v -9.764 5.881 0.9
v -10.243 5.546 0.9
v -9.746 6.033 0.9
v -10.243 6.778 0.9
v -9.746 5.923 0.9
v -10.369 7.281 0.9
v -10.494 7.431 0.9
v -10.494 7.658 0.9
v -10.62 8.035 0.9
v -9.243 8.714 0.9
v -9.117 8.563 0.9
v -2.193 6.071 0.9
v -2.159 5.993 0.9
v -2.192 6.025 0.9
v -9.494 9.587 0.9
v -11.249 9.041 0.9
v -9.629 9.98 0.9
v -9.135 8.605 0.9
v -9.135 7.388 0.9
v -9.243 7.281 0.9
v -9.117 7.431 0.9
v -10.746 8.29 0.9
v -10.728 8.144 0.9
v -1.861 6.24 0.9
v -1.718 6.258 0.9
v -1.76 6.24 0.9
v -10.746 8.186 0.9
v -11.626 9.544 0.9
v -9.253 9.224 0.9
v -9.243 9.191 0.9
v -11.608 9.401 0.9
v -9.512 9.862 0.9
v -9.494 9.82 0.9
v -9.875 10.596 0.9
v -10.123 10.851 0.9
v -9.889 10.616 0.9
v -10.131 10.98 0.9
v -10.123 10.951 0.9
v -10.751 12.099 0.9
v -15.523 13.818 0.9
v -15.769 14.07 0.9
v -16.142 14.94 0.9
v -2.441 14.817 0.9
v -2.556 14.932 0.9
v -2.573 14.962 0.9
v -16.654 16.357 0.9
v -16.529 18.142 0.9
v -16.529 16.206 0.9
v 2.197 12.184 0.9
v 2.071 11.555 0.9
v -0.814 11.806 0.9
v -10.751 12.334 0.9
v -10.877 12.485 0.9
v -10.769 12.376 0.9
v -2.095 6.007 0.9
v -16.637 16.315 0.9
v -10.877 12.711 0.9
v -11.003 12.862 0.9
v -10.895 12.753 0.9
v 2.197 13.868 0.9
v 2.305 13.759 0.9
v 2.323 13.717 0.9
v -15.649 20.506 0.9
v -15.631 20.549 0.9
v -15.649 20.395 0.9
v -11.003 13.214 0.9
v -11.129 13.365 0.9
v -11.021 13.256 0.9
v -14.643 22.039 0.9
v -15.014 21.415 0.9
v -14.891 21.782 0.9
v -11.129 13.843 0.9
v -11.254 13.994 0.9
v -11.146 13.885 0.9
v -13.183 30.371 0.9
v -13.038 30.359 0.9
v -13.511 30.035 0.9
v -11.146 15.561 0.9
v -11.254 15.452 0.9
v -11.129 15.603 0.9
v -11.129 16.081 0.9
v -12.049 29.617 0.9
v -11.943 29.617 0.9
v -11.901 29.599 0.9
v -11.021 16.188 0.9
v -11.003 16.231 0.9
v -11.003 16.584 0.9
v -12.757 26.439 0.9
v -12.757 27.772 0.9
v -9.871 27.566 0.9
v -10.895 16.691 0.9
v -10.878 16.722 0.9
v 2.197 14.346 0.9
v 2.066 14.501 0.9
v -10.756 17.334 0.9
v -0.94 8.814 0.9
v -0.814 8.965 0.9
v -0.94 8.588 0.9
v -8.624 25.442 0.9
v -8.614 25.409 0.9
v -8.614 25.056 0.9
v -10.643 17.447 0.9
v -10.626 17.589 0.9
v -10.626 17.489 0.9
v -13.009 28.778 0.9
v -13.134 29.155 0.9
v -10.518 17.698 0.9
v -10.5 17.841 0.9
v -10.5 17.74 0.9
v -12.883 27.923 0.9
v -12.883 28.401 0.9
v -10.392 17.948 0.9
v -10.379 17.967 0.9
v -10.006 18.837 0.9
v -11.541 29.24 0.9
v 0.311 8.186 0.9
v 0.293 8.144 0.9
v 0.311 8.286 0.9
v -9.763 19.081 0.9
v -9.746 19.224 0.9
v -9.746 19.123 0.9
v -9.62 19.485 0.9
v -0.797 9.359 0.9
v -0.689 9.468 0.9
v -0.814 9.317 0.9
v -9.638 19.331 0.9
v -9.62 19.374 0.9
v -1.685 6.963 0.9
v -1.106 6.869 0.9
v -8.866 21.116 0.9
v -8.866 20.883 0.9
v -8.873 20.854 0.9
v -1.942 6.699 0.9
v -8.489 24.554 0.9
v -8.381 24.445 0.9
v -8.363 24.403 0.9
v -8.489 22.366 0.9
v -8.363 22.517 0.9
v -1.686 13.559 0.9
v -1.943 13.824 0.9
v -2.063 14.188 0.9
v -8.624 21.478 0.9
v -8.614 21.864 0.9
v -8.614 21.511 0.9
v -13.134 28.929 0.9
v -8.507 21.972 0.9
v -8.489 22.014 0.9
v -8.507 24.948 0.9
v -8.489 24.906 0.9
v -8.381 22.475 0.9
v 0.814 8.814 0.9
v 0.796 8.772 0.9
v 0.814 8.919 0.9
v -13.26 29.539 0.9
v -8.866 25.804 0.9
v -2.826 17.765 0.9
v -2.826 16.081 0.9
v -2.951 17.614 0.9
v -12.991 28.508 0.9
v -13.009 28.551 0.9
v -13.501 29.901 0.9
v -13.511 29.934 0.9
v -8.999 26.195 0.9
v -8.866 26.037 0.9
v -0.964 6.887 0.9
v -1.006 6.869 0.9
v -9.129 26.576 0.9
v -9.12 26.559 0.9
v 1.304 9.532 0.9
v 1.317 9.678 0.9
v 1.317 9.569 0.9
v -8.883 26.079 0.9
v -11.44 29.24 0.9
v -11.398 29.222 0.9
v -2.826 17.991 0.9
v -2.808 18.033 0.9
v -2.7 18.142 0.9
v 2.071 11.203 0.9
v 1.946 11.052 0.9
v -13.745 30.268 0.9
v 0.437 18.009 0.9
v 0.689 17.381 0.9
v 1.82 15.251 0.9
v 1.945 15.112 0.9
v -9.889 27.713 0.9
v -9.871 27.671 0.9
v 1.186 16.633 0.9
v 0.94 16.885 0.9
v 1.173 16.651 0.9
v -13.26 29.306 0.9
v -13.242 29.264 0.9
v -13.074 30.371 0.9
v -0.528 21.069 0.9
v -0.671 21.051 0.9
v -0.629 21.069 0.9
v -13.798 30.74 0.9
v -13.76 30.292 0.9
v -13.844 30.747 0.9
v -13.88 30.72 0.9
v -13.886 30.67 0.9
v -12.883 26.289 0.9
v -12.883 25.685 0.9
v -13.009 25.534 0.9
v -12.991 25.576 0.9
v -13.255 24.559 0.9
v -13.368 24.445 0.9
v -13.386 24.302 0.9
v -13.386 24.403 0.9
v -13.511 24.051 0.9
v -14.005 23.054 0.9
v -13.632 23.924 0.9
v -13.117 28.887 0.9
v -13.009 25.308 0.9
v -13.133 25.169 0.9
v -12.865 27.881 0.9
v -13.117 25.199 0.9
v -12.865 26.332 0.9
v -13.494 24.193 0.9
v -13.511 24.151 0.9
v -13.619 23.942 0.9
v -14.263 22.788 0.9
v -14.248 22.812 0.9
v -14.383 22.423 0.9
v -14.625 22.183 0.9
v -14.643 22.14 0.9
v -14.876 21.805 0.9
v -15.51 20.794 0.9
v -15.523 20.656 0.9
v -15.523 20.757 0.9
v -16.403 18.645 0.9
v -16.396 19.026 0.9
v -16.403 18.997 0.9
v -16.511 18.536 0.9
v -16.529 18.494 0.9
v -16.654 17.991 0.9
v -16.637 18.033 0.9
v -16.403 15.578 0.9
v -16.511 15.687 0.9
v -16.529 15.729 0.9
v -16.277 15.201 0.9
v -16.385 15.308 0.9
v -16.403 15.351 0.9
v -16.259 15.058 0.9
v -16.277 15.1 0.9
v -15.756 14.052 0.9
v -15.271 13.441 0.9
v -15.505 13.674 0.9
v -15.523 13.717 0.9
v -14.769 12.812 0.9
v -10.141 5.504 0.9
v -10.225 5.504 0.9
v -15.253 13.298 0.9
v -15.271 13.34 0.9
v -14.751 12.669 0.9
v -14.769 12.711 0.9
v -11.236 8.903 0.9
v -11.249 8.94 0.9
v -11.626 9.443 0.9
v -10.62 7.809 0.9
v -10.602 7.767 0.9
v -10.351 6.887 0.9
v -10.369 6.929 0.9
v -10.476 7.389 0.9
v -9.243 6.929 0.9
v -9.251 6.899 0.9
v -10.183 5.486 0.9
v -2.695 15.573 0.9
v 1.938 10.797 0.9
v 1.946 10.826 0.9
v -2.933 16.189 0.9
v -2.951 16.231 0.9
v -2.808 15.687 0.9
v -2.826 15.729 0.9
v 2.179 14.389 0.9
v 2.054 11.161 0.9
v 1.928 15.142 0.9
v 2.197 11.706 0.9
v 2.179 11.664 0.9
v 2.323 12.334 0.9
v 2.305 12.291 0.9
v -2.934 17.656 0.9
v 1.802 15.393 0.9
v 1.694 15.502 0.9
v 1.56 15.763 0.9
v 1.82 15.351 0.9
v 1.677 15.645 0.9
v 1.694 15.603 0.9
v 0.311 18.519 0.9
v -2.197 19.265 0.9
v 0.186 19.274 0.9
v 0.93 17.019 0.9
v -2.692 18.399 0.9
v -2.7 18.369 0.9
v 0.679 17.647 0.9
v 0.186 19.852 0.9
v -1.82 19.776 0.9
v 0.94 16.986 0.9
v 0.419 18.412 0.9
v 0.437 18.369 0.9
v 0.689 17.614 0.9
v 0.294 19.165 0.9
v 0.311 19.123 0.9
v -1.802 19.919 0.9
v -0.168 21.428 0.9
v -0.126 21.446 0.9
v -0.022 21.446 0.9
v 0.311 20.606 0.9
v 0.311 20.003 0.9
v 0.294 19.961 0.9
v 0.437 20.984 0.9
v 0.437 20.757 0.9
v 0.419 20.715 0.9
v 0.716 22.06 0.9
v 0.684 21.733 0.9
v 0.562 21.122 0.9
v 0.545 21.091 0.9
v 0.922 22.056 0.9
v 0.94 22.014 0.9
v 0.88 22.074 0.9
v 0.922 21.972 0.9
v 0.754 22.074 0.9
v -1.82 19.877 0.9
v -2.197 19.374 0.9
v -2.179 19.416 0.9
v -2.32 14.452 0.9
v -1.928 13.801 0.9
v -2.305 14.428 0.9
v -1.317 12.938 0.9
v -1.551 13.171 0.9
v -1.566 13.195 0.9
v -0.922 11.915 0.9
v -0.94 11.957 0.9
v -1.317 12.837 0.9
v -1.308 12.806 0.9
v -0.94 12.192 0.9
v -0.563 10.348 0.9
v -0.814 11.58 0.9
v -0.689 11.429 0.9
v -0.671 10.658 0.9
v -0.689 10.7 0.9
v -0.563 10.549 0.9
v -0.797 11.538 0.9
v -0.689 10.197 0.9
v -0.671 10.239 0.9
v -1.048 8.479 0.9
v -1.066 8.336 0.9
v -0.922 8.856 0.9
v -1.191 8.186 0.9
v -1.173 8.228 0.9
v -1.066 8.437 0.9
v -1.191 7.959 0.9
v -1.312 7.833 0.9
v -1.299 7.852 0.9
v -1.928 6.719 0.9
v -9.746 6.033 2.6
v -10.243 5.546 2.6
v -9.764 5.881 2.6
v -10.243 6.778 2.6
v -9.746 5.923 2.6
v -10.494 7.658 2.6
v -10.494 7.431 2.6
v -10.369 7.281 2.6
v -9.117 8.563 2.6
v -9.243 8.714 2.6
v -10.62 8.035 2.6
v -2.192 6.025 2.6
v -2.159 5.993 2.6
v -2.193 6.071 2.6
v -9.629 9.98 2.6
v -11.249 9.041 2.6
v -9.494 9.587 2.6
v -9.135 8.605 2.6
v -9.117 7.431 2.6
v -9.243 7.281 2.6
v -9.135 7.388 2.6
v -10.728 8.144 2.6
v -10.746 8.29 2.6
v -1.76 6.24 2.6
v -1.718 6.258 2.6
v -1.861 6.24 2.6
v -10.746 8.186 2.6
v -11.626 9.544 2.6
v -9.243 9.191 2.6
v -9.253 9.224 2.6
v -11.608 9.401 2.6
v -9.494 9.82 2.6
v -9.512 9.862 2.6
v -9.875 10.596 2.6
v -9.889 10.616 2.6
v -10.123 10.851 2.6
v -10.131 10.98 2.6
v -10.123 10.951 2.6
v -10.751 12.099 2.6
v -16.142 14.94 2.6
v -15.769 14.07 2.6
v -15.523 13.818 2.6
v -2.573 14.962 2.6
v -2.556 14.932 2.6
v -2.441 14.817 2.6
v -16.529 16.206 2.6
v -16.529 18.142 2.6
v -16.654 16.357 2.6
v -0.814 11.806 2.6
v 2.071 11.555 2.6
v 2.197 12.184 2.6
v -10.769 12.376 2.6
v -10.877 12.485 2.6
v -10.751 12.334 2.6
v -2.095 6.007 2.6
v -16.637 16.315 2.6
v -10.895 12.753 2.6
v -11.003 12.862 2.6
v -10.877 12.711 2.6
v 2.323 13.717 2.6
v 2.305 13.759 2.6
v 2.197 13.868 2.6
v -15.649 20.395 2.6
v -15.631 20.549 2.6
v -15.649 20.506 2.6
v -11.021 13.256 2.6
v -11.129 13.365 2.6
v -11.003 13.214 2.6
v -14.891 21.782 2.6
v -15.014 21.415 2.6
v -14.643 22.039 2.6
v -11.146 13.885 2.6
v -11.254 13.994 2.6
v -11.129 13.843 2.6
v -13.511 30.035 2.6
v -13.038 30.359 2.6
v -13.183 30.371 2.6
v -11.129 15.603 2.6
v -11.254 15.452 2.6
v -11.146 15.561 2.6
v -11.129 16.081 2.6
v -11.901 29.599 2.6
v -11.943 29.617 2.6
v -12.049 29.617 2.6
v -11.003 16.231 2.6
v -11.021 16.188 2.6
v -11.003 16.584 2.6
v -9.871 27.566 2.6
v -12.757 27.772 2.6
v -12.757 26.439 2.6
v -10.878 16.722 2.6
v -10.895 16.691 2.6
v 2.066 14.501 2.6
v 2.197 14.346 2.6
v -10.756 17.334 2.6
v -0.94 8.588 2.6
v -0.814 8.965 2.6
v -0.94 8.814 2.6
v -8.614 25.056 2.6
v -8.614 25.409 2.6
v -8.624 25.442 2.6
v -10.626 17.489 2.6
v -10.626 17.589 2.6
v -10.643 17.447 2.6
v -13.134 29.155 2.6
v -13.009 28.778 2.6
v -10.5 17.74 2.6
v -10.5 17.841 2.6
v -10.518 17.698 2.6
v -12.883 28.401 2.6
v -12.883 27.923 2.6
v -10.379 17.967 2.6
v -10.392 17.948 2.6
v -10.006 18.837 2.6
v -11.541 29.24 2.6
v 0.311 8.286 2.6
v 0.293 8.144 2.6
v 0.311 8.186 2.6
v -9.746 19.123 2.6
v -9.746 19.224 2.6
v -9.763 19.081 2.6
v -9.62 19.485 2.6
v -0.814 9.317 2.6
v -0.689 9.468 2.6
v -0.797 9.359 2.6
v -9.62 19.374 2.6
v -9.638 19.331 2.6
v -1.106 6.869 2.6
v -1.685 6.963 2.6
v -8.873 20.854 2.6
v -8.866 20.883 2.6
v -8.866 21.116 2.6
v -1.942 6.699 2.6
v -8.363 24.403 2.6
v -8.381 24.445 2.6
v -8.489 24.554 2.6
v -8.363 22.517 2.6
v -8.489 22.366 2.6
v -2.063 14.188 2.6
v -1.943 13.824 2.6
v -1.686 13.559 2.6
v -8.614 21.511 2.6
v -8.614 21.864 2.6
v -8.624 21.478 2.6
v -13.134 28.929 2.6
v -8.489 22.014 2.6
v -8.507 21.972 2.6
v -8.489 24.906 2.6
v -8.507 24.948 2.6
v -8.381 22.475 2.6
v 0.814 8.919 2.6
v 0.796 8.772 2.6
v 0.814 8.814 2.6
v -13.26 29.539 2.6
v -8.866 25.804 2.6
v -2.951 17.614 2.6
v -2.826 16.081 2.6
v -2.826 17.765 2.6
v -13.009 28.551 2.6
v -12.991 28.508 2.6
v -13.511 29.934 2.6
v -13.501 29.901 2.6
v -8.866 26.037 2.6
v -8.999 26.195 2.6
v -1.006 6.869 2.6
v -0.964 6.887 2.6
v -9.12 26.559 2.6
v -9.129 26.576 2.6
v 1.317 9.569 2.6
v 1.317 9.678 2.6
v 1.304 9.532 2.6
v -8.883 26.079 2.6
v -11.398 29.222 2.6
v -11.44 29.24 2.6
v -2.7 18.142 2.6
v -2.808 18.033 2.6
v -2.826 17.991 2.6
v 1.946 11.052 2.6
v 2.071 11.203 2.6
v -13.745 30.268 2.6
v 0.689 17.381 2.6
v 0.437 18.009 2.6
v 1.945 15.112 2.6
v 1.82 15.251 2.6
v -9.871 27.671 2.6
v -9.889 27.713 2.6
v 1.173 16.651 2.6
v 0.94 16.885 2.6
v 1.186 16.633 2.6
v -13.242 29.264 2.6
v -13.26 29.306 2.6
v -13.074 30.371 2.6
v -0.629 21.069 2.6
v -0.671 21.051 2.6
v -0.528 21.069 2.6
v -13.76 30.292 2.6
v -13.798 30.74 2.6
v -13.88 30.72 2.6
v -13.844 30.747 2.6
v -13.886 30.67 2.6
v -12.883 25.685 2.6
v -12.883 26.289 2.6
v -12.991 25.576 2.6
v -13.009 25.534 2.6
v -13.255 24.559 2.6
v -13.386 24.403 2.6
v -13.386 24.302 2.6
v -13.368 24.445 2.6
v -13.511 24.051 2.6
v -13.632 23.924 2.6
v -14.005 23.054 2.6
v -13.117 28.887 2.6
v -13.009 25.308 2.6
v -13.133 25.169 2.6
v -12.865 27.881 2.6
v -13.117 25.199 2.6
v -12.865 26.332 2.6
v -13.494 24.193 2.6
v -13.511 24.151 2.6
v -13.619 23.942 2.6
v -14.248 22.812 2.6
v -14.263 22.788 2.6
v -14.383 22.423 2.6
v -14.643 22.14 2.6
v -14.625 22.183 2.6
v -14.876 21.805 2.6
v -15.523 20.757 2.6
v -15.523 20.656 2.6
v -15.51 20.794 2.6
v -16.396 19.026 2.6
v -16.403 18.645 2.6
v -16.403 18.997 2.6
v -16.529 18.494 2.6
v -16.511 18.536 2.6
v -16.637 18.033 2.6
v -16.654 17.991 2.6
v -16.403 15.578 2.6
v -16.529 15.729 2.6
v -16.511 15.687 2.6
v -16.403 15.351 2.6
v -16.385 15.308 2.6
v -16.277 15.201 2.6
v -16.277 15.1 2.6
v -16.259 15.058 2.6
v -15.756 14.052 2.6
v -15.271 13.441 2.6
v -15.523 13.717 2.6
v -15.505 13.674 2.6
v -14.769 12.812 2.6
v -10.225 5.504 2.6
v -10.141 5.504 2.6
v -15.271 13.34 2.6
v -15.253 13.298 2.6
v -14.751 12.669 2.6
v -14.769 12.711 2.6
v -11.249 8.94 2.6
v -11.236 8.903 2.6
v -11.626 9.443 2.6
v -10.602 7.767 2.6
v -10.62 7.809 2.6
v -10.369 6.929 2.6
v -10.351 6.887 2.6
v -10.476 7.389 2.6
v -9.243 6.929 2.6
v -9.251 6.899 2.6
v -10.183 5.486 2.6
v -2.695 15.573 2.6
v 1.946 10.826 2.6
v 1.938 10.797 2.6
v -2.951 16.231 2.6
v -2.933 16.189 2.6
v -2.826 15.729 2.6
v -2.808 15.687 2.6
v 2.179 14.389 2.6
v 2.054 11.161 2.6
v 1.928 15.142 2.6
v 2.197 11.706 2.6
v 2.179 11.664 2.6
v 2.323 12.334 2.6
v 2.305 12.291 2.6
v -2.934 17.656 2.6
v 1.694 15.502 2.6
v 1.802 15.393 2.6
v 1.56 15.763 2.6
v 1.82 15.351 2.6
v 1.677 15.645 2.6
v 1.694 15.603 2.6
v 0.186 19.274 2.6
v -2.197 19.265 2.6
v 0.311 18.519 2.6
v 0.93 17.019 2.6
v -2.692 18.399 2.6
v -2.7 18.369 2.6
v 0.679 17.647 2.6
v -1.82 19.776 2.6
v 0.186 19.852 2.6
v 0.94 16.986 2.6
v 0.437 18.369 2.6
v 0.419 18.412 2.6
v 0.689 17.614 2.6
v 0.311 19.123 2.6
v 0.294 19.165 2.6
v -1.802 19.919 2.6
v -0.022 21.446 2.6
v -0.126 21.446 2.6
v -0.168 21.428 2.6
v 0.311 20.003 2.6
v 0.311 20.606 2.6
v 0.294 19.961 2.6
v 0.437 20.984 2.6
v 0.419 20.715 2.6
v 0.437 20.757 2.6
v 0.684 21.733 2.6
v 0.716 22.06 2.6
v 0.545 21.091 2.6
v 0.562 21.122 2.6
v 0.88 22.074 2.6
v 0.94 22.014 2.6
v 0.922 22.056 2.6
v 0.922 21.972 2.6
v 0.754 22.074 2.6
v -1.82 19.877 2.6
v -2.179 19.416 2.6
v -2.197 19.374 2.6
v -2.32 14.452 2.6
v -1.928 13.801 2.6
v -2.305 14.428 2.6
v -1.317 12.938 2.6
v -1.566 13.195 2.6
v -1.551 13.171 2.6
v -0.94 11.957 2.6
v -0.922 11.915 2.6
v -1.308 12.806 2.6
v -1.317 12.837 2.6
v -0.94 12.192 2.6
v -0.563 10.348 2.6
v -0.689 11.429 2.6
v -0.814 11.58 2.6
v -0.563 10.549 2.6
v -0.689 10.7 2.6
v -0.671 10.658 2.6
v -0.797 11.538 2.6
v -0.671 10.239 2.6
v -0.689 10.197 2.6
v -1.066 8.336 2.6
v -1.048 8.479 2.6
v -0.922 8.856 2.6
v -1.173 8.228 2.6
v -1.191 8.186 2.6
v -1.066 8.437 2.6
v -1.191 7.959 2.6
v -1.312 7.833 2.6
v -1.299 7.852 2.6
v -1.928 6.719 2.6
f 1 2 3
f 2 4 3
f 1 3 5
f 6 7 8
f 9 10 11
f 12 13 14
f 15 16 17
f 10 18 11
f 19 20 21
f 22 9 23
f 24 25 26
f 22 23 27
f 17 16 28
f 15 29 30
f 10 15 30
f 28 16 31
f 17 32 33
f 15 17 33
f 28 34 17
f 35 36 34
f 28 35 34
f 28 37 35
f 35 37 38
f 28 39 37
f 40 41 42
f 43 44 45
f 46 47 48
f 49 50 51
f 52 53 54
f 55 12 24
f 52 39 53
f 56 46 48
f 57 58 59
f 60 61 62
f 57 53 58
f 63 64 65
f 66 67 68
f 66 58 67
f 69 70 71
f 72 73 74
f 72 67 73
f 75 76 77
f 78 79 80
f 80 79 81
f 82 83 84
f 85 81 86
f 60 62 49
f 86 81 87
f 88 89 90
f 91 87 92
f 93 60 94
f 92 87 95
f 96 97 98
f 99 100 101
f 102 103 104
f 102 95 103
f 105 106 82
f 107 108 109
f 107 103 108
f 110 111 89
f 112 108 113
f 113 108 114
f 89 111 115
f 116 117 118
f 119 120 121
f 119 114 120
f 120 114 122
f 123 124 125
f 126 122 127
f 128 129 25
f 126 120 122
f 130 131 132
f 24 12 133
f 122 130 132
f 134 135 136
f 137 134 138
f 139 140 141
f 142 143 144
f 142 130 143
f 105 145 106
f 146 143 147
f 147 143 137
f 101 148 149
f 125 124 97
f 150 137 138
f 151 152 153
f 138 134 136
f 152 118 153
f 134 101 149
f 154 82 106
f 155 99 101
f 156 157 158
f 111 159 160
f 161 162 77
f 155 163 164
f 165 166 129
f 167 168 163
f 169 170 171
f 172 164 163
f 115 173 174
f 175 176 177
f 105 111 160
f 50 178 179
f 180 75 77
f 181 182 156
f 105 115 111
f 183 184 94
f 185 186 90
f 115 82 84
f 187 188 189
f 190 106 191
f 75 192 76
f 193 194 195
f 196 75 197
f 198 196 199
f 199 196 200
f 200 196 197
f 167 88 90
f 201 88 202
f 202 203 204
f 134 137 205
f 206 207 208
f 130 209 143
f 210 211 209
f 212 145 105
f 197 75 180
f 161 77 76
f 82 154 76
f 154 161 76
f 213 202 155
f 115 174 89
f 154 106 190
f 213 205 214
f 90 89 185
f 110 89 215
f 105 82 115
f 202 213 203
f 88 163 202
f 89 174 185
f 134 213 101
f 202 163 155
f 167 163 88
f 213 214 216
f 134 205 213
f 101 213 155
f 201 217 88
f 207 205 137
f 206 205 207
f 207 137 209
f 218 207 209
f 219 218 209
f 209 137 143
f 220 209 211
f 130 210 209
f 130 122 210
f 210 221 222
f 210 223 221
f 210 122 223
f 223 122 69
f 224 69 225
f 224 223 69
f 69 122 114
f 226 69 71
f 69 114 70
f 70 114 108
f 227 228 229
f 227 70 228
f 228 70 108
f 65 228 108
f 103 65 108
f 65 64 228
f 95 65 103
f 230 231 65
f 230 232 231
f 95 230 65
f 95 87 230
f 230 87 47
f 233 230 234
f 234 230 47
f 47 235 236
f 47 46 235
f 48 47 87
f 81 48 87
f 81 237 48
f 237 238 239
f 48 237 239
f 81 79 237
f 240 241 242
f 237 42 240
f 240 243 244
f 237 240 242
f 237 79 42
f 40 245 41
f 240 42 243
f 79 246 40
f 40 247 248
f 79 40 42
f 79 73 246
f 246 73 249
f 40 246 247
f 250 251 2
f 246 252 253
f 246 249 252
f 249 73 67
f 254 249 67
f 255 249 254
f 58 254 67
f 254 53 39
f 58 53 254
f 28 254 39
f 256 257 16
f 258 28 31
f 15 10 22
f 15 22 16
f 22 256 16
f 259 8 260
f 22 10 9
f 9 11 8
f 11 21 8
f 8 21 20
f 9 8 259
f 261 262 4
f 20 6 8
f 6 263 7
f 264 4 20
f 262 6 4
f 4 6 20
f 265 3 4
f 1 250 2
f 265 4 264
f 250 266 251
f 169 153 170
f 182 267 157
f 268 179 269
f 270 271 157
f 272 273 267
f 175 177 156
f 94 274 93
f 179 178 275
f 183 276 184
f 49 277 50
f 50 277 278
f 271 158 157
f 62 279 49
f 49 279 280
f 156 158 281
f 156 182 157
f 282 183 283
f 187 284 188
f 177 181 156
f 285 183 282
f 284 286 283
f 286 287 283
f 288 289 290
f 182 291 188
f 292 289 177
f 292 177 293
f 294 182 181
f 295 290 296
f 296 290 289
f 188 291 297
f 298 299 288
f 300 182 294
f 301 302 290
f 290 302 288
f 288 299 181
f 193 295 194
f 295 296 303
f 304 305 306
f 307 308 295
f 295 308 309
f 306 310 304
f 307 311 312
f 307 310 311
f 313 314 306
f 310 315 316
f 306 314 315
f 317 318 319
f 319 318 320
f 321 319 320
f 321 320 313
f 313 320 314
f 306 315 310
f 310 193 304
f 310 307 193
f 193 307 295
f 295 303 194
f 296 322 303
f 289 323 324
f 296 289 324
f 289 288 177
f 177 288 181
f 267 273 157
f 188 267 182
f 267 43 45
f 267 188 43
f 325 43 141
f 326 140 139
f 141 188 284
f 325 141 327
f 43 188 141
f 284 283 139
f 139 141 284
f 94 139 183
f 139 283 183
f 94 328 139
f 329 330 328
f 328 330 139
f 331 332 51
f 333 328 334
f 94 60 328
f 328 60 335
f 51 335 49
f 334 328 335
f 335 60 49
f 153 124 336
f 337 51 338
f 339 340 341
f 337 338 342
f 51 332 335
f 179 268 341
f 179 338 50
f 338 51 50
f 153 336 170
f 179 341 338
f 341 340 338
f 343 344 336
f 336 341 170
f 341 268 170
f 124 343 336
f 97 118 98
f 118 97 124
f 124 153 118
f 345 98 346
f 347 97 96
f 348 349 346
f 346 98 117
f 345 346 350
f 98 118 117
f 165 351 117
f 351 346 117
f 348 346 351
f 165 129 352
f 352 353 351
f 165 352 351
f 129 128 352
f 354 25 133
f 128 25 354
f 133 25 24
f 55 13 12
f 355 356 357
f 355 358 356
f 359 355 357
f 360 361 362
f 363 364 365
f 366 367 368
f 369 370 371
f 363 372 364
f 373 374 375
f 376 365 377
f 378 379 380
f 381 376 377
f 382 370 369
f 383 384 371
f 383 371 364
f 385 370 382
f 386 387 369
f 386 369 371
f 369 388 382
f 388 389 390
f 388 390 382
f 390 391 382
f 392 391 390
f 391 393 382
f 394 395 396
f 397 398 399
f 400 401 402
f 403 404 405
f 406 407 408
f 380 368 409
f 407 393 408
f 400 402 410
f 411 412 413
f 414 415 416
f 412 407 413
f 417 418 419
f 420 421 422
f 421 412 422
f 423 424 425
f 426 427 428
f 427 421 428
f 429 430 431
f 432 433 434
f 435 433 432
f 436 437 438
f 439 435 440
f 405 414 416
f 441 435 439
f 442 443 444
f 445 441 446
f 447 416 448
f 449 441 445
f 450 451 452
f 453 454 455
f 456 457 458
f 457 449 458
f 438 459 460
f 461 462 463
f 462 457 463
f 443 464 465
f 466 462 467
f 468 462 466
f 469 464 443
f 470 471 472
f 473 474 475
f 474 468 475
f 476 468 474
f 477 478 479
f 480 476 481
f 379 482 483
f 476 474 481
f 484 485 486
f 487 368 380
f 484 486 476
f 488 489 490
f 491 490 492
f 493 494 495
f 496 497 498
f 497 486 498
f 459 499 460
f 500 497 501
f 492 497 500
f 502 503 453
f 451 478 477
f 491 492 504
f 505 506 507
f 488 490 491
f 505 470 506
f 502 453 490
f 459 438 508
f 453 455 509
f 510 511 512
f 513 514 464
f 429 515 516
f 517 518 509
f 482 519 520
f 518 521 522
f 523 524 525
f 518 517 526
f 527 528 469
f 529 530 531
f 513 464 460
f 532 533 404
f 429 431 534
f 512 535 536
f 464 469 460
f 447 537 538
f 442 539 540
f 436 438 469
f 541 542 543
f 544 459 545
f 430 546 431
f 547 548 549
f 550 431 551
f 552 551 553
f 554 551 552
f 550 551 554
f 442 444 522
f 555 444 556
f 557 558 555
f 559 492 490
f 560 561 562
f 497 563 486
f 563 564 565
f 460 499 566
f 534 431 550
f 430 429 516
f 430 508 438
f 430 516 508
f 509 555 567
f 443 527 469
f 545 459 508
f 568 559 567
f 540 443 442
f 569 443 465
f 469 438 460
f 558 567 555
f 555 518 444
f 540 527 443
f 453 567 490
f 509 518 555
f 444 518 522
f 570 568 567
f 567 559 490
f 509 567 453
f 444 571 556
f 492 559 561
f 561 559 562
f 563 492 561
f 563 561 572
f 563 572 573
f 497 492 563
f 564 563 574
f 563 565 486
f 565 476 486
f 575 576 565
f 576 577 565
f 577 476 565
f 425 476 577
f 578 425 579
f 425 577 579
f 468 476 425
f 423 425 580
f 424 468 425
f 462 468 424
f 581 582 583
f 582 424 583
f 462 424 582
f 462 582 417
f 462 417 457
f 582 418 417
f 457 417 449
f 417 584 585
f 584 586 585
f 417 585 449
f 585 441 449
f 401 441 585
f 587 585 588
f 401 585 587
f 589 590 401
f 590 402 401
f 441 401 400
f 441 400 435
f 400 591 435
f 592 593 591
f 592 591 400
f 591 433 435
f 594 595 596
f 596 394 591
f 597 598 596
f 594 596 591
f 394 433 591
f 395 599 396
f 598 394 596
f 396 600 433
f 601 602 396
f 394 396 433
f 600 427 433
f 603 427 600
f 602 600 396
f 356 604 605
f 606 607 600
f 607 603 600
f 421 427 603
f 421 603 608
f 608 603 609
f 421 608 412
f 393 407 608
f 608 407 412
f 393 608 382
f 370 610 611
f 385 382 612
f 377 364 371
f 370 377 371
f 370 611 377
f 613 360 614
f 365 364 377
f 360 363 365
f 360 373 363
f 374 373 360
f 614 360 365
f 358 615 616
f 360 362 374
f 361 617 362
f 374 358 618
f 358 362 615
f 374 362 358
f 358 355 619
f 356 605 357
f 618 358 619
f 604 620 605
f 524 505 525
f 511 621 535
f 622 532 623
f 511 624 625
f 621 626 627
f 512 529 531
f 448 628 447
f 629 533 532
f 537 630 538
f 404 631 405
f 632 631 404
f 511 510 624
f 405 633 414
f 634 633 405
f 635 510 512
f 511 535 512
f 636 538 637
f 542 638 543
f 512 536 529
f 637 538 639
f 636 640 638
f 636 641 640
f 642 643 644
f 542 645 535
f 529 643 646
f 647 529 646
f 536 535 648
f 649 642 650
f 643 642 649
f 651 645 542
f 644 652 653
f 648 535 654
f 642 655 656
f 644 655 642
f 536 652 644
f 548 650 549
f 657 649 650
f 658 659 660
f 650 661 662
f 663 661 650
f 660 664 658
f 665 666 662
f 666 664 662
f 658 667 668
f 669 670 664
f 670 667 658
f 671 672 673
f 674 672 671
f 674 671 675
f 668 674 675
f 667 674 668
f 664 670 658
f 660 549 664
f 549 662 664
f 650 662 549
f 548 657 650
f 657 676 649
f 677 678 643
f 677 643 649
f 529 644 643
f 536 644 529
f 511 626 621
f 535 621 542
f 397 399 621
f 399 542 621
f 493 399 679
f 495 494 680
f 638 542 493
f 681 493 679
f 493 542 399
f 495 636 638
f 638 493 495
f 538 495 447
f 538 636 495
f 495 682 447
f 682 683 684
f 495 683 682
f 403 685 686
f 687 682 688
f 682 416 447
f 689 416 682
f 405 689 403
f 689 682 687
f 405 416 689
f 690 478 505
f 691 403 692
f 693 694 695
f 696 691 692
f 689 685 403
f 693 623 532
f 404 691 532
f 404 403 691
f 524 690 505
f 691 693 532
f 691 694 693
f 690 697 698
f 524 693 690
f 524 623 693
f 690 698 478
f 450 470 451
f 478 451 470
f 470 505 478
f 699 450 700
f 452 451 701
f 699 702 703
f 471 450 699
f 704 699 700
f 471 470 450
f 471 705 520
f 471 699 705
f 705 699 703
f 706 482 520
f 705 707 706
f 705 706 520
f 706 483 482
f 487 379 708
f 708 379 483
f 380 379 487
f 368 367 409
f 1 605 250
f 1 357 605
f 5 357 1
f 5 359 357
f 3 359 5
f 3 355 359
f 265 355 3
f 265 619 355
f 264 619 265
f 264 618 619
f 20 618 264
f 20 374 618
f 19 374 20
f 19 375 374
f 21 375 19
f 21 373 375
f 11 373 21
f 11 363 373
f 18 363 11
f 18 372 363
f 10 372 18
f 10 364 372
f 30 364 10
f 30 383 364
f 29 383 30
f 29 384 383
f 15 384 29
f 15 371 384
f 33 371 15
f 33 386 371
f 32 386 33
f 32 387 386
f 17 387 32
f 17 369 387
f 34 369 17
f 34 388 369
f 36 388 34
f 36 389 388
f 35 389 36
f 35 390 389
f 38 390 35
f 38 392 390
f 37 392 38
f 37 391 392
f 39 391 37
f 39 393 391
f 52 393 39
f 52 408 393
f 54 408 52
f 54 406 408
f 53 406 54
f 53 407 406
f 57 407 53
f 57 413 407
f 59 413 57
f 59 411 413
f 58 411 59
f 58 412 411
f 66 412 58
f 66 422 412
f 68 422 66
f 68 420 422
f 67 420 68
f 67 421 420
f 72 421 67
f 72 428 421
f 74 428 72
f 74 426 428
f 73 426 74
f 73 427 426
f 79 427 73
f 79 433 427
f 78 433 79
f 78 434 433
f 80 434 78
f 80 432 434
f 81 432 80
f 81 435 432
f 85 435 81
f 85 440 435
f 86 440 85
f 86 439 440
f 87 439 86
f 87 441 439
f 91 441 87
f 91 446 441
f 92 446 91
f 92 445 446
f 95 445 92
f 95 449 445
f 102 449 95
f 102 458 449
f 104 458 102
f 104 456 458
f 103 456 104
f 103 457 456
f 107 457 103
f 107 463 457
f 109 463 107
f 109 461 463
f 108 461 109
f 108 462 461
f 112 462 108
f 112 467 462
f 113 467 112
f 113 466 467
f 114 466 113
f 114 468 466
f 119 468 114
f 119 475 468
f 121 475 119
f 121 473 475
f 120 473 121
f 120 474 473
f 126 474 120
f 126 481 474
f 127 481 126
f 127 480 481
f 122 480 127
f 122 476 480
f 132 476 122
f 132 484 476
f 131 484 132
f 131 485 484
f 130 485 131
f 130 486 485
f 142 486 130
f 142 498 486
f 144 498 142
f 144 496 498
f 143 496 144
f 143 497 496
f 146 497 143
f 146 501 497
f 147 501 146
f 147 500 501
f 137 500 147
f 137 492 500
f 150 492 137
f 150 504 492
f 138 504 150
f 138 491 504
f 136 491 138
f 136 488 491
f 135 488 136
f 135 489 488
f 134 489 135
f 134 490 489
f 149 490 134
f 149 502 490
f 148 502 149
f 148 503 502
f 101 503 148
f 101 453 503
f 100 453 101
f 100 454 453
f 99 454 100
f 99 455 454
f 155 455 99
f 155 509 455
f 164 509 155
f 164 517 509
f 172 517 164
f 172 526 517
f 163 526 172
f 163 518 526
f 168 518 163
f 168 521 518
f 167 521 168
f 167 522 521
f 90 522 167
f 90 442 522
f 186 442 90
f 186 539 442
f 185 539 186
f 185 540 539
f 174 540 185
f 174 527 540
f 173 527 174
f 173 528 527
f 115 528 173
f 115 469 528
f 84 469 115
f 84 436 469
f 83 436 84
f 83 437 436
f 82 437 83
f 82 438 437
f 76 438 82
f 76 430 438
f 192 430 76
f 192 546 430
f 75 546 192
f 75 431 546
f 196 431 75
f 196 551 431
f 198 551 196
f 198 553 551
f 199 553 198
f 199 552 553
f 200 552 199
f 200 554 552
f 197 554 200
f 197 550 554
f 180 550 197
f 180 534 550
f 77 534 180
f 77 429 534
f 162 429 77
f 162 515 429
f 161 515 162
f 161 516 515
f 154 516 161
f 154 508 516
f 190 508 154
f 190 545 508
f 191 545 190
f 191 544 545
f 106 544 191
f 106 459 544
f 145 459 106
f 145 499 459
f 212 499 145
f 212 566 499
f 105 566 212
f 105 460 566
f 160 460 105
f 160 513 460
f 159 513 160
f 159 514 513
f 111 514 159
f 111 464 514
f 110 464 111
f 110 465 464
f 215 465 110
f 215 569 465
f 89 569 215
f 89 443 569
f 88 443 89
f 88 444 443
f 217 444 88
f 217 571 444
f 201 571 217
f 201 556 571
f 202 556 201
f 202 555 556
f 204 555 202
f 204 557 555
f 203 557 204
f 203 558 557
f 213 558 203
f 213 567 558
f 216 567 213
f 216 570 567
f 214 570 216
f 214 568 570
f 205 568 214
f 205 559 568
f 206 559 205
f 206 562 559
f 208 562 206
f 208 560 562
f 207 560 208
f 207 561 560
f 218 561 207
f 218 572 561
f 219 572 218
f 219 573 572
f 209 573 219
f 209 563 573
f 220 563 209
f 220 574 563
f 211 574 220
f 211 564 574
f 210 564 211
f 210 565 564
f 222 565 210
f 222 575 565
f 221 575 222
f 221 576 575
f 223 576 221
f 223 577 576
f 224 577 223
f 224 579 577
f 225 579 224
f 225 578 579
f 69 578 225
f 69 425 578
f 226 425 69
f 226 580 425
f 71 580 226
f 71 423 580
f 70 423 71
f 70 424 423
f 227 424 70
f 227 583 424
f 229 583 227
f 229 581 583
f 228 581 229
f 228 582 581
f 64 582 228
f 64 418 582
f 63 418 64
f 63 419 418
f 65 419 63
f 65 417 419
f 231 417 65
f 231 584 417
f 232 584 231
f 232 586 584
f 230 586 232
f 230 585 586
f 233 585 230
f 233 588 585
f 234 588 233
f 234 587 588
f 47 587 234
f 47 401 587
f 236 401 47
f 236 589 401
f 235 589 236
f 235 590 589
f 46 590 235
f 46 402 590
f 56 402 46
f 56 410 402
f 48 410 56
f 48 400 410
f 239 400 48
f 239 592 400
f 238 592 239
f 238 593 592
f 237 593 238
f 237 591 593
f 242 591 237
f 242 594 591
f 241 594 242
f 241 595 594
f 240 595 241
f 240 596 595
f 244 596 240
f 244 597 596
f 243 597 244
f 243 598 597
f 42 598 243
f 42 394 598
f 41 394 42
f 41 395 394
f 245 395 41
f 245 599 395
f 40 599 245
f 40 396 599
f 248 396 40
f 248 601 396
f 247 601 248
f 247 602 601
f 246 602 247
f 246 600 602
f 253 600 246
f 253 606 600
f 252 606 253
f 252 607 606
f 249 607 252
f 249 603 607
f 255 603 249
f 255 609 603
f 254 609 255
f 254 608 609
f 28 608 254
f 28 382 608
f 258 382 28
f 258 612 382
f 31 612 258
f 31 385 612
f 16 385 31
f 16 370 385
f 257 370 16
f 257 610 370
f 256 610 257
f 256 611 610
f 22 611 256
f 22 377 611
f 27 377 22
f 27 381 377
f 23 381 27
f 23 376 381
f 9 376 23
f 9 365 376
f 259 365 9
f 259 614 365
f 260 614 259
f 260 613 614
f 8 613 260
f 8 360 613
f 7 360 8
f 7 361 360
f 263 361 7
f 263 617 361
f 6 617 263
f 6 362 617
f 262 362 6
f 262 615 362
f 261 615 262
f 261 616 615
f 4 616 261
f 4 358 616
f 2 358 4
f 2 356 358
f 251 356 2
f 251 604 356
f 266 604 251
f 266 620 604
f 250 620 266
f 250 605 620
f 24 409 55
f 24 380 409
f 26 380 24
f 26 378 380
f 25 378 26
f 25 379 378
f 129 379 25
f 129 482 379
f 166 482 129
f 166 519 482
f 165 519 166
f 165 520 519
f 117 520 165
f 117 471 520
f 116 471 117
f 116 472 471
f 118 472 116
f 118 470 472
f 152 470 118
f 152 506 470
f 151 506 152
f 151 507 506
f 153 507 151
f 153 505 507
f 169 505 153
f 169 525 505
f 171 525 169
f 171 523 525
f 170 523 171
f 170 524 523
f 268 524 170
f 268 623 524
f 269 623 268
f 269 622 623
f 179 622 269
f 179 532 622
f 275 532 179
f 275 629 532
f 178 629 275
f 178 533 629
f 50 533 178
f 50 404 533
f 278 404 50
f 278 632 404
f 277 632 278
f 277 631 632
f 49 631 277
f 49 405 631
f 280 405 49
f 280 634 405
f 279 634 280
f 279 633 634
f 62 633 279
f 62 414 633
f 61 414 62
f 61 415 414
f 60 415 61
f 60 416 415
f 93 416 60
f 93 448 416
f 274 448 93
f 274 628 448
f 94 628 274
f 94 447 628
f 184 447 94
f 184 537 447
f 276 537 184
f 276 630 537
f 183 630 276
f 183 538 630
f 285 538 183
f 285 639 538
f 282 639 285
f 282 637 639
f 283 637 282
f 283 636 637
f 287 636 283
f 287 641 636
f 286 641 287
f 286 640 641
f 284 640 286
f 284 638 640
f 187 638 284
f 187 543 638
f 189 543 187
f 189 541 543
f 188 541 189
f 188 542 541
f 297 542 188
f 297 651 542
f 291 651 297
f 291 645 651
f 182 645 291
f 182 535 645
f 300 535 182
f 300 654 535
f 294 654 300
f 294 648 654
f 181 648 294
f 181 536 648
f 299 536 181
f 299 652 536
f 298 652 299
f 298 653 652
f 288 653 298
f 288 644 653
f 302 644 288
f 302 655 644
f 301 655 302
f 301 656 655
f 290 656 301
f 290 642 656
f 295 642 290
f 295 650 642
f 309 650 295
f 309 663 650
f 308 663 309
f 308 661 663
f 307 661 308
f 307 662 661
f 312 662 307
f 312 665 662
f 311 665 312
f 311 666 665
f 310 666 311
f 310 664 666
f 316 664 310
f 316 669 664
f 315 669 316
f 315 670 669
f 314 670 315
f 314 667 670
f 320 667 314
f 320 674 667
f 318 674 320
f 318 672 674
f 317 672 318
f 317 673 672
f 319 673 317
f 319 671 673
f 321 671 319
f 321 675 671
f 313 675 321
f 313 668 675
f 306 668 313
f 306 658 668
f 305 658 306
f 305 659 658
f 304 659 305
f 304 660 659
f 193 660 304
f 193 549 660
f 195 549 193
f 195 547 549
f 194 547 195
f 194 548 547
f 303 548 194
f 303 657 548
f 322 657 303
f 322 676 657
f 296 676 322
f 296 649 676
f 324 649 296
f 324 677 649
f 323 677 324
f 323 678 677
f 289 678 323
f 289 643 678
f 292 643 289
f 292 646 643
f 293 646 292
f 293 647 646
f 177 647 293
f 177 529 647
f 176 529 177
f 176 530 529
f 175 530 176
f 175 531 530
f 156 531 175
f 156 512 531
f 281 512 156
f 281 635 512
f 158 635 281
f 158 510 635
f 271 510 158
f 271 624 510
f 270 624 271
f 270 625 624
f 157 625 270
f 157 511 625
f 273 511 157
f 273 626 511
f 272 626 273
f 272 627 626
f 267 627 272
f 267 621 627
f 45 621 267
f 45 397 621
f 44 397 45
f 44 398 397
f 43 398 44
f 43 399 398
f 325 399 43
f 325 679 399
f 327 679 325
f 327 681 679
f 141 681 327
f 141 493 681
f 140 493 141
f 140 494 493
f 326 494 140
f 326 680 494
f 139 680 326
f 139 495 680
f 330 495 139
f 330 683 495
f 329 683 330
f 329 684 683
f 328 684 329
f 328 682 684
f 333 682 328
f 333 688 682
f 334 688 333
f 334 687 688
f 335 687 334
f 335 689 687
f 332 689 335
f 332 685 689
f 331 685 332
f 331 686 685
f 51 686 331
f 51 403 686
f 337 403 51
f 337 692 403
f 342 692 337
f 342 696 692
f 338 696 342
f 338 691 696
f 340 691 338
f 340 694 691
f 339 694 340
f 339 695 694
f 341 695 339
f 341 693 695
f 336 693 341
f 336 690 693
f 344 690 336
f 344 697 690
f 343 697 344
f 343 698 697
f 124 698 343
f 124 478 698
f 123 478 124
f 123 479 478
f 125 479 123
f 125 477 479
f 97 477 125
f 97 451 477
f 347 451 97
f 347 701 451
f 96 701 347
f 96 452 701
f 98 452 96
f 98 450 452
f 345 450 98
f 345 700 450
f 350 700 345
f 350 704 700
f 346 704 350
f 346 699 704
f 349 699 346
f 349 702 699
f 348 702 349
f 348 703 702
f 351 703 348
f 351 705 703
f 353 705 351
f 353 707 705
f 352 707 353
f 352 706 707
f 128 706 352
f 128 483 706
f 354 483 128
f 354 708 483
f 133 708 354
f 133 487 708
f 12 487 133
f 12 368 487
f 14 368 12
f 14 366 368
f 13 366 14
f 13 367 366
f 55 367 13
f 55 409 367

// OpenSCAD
$fn = 24;
translate([0, -2.500, 0.900])
  linear_extrude(height=1.700) {
offset(r=0.06, $fn=8) {
    polygon(points=[[0.880,24.514],[0.754,24.514],[0.000,23.886],[-0.126,23.886],[-0.503,23.509],[-0.629,23.509],[-1.760,22.377],[-1.760,22.251],[-2.137,21.874],[-2.137,21.749],[-2.640,20.869],[-2.640,20.617],[-2.766,20.491],[-2.766,20.240],[-2.891,20.114],[-2.891,18.731],[-2.766,18.606],[-2.766,18.229],[-2.640,18.103],[-2.514,17.474],[-2.389,17.349],[-2.263,16.971],[-2.011,16.720],[-1.886,16.343],[-1.634,16.091],[-1.509,15.714],[-1.257,15.463],[-1.257,15.337],[-0.880,14.709],[-0.880,14.457],[-0.754,14.331],[-0.754,14.080],[-0.629,13.954],[-0.629,13.200],[-0.503,13.074],[-0.503,12.823],[-0.629,12.697],[-0.629,11.943],[-0.754,11.817],[-0.754,11.440],[-0.880,11.314],[-0.880,11.063],[-1.006,10.937],[-1.006,10.811],[-1.131,10.686],[-1.131,10.434],[-1.257,10.309],[-1.634,9.429],[-1.886,9.177],[-2.137,8.549],[-1.886,8.800],[-1.760,8.800],[-1.131,9.429],[-1.006,9.429],[0.251,10.686],[0.251,10.811],[0.754,11.314],[0.754,11.440],[1.257,12.069],[1.257,12.194],[1.886,13.326],[1.886,13.577],[2.011,13.703],[2.011,14.080],[2.137,14.206],[2.137,14.709],[2.263,14.834],[2.263,16.217],[2.137,16.343],[2.137,16.846],[2.011,16.971],[1.886,17.600],[1.760,17.726],[1.760,17.851],[1.634,17.977],[1.634,18.103],[1.509,18.229],[1.131,19.109],[0.880,19.360],[0.880,19.486],[0.629,19.863],[0.629,20.114],[0.377,20.491],[0.377,20.869],[0.251,20.994],[0.251,21.623],[0.126,21.749],[0.126,22.377],[0.251,22.503],[0.251,23.131],[0.377,23.257],[0.377,23.509],[0.503,23.634],[0.629,24.263]], paths=[[0,1,2,3,4,5,6,7,8,9,10,11,12,13,14,15,16,17,18,19,20,21,22,23,24,25,26,27,28,29,30,31,32,33,34,35,36,37,38,39,40,41,42,43,44,45,46,47,48,49,50,51,52,53,54,55,56,57,58,59,60,61,62,63,64,65,66,67,68,69,70,71,72,73,74,75,76,77,78,79,80,81,82,83,84,85,86,87,88,89,90,91,92,93]]);
    polygon(points=[[-13.829,33.189],[-13.703,32.811],[-13.451,32.560],[-13.451,32.434],[-13.200,32.057],[-13.200,31.806],[-13.074,31.680],[-13.074,31.429],[-12.949,31.303],[-12.949,31.051],[-12.823,30.926],[-12.823,30.423],[-12.697,30.297],[-12.697,28.914],[-12.823,28.789],[-12.823,28.160],[-12.949,28.034],[-12.949,27.783],[-13.074,27.657],[-13.200,27.029],[-13.326,26.903],[-13.326,26.777],[-13.451,26.651],[-13.451,26.526],[-13.577,26.400],[-13.954,25.520],[-14.206,25.269],[-14.331,24.891],[-14.583,24.640],[-14.583,24.514],[-14.834,24.263],[-14.960,23.886],[-15.463,23.257],[-15.463,23.131],[-15.589,23.006],[-15.589,22.880],[-16.343,21.497],[-16.343,21.120],[-16.469,20.994],[-16.469,20.617],[-16.594,20.491],[-16.594,18.857],[-16.469,18.731],[-16.469,18.229],[-16.343,18.103],[-16.343,17.851],[-16.217,17.726],[-16.217,17.600],[-16.091,17.474],[-15.714,16.594],[-15.463,16.343],[-15.463,16.217],[-15.211,15.966],[-15.211,15.840],[-14.709,15.337],[-14.709,15.211],[-11.566,12.069],[-11.566,11.943],[-11.189,11.566],[-11.189,11.440],[-10.686,10.811],[-10.686,10.686],[-10.560,10.560],[-10.560,10.309],[-10.434,10.183],[-10.434,9.931],[-10.309,9.806],[-10.309,9.429],[-10.183,9.303],[-10.183,8.046],[-9.806,8.423],[-9.806,8.549],[-9.303,9.429],[-9.303,9.806],[-9.177,9.931],[-9.177,11.063],[-9.303,11.189],[-9.303,11.691],[-9.554,12.069],[-9.554,12.320],[-9.680,12.446],[-9.931,13.074],[-10.183,13.326],[-10.183,13.451],[-10.811,14.583],[-10.811,14.834],[-10.937,14.960],[-10.937,15.211],[-11.063,15.337],[-11.063,15.714],[-11.189,15.840],[-11.189,16.343],[-11.314,16.469],[-11.314,17.977],[-11.189,18.103],[-11.189,18.606],[-11.063,18.731],[-11.063,19.109],[-10.937,19.234],[-10.811,19.863],[-10.686,19.989],[-10.686,20.114],[-10.560,20.240],[-10.560,20.366],[-10.434,20.491],[-10.057,21.371],[-9.806,21.623],[-9.806,21.749],[-9.680,21.874],[-9.680,22.000],[-8.926,23.383],[-8.926,23.634],[-8.674,24.011],[-8.674,24.389],[-8.549,24.514],[-8.549,24.891],[-8.423,25.017],[-8.423,26.903],[-8.549,27.029],[-8.549,27.406],[-8.674,27.531],[-8.674,27.909],[-8.926,28.286],[-8.926,28.537],[-9.051,28.663],[-9.177,29.040],[-9.931,30.046],[-9.931,30.171],[-11.440,31.680],[-11.566,31.680],[-11.943,32.057],[-12.069,32.057],[-13.074,32.811],[-13.200,32.811]], paths=[[0,1,2,3,4,5,6,7,8,9,10,11,12,13,14,15,16,17,18,19,20,21,22,23,24,25,26,27,28,29,30,31,32,33,34,35,36,37,38,39,40,41,42,43,44,45,46,47,48,49,50,51,52,53,54,55,56,57,58,59,60,61,62,63,64,65,66,67,68,69,70,71,72,73,74,75,76,77,78,79,80,81,82,83,84,85,86,87,88,89,90,91,92,93,94,95,96,97,98,99,100,101,102,103,104,105,106,107,108,109,110,111,112,113,114,115,116,117,118,119,120,121,122,123,124,125,126,127,128,129,130,131,132,133]]);
}
}
